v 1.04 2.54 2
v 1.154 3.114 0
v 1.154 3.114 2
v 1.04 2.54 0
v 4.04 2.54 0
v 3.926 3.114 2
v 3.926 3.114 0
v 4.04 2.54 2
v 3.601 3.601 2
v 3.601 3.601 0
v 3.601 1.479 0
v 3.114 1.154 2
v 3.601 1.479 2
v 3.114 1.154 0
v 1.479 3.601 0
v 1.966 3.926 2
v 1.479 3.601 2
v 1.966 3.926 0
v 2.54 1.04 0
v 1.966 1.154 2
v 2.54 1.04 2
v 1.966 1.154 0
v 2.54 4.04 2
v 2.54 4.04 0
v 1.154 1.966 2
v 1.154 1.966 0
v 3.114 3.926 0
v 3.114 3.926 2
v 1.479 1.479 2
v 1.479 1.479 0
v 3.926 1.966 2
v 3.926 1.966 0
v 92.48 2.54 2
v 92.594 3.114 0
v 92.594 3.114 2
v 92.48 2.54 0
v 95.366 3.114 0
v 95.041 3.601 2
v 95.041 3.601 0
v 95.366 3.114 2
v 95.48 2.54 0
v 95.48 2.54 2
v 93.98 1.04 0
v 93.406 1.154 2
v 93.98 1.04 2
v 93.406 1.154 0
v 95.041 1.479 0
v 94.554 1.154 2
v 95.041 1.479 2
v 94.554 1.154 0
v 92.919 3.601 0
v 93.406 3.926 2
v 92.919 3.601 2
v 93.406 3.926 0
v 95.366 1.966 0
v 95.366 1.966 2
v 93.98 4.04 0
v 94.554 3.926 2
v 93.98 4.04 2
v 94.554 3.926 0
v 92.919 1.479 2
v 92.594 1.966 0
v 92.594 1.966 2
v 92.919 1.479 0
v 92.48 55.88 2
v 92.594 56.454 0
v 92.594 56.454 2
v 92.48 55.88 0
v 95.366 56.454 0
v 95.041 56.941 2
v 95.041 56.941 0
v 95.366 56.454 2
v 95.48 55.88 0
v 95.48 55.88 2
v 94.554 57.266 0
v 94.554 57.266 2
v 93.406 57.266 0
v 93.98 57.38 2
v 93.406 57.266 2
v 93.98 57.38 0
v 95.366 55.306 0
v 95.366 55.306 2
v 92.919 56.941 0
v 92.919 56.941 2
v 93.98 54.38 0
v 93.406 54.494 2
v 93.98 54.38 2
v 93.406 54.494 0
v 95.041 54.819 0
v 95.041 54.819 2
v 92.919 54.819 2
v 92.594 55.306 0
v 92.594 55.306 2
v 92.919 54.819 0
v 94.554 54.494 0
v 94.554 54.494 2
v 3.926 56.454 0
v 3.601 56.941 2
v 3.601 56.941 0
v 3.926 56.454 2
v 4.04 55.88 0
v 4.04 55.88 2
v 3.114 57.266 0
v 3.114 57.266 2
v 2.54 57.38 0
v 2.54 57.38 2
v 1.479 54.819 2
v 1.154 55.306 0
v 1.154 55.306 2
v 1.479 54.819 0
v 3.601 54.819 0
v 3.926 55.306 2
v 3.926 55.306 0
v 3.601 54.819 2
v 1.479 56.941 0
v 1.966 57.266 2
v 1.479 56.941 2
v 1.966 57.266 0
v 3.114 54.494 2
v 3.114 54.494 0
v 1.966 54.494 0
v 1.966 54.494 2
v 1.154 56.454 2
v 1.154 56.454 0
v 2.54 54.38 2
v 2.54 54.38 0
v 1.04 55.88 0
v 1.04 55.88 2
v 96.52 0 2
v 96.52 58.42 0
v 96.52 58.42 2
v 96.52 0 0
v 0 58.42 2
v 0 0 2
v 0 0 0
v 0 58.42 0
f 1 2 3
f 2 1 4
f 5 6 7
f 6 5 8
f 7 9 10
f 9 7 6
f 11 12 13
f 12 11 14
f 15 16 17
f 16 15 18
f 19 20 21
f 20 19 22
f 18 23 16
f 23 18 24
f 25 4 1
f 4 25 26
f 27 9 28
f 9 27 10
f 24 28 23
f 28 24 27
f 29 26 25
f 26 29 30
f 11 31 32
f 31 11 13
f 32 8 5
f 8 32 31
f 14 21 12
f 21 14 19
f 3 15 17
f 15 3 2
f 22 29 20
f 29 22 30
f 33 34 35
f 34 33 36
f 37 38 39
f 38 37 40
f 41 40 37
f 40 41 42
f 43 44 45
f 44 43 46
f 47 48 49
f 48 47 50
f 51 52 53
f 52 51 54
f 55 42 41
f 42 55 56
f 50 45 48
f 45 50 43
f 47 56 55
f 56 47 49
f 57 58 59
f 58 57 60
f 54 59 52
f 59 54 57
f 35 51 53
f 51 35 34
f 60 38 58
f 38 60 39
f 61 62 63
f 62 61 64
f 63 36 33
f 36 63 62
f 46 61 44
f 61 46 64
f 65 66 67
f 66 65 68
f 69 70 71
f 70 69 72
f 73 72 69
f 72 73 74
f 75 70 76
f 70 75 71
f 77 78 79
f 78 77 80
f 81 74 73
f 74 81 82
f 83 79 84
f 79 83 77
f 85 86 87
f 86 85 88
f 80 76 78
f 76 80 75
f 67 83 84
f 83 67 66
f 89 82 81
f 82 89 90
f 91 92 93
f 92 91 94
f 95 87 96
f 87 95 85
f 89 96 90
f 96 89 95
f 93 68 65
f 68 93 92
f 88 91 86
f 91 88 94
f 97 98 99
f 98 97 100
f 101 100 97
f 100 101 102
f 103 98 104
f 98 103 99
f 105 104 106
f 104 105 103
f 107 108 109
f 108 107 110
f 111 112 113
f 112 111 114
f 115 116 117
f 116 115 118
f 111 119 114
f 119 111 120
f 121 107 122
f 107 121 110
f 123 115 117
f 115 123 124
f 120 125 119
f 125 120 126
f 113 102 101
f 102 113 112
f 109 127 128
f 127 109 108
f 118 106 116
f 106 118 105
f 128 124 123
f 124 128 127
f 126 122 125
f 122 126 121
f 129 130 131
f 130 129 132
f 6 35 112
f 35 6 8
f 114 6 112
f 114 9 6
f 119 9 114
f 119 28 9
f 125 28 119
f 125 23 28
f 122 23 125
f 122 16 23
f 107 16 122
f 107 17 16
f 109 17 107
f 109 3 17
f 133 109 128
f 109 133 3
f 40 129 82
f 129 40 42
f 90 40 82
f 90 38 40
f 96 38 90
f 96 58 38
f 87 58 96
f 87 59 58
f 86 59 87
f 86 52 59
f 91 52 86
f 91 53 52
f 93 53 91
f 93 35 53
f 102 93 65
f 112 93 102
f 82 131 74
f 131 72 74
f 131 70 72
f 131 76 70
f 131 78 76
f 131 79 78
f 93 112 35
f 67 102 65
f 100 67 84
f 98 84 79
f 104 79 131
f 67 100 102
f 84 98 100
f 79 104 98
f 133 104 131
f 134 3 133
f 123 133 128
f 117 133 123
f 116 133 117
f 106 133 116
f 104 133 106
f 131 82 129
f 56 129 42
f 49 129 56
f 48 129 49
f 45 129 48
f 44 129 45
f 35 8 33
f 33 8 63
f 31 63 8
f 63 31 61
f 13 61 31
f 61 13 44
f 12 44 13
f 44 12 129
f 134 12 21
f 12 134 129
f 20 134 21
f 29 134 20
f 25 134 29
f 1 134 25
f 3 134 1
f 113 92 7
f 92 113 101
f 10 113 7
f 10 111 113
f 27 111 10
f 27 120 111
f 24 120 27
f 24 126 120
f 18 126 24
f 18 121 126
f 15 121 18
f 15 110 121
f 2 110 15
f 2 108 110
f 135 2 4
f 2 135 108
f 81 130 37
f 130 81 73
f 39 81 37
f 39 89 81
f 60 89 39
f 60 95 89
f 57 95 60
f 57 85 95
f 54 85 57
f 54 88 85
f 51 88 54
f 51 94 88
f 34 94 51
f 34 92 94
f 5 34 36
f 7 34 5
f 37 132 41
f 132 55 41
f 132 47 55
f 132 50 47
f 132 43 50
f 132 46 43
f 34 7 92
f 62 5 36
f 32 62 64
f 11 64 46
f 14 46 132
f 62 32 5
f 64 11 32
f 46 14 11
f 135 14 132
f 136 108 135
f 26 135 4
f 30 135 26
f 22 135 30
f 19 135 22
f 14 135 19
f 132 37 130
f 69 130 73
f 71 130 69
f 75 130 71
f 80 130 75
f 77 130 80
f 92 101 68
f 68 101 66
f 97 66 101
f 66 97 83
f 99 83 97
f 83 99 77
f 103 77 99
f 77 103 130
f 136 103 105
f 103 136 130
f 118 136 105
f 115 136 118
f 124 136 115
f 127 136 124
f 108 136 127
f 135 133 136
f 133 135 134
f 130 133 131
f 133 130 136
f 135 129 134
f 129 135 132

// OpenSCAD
// file: metrics.scad
// CARD (https://www.ebay.de/itm/273026026604)
CW = 85.0;//mm card width   < 34 x 2.54
CH = 54.0;//mm card height  < 22 x 2.54 
CT =  0.9;//mm card thickness

// POCKET (https://www.hornbach.de/shop/Hobbyglas-2x250x500-mm-Glatt-klar/1477798/artikel.html)
PW = 38 * 2.54;//mm width
PH = 23 * 2.54;//mm height
PT =  1 * 2.00;//mm thickness
PP =  2 * 1.00;//mm pocket padding (left/right)

// PCB (https://www.ebay.de/itm/183729215412)
PCBH = PH + 8 * 2.54;//mm height
PCBT = 1.2;//mm thickness
PCBD = 0.5;//mm drillings radius

// FRONT
FW = 245;//mm WIDTH
FH = 140;//mm HEIGHT
FT =   5;//mm thickness
FS = 100;//mm SPEAKER DIAMETER
FB = 16; //mm BUTTON DIAMETER
// main file
include <metrics.scad>;

module CardPocketHoles(T){
    translate([   2.54,   2.54,-1])cylinder(T+2,1.5,1.5,$fn=16);
    translate([PW-2.54,   2.54,-1])cylinder(T+2,1.5,1.5,$fn=16);
    translate([PW-2.54,PH-2.54,-1])cylinder(T+2,1.5,1.5,$fn=16);
    translate([   2.54,PH-2.54,-1])cylinder(T+2,1.5,1.5,$fn=16);
}

module CardPocketUpper(){
    color("DeepSkyBlue",0.5)difference() {
        cube([PW,PH,PT]);
        CardPocketHoles(PT);
    }
}

CardPocketUpper();



echo(str("CardPocketUpper: ",PW,"x",PH,"x",PT,"mm"));
